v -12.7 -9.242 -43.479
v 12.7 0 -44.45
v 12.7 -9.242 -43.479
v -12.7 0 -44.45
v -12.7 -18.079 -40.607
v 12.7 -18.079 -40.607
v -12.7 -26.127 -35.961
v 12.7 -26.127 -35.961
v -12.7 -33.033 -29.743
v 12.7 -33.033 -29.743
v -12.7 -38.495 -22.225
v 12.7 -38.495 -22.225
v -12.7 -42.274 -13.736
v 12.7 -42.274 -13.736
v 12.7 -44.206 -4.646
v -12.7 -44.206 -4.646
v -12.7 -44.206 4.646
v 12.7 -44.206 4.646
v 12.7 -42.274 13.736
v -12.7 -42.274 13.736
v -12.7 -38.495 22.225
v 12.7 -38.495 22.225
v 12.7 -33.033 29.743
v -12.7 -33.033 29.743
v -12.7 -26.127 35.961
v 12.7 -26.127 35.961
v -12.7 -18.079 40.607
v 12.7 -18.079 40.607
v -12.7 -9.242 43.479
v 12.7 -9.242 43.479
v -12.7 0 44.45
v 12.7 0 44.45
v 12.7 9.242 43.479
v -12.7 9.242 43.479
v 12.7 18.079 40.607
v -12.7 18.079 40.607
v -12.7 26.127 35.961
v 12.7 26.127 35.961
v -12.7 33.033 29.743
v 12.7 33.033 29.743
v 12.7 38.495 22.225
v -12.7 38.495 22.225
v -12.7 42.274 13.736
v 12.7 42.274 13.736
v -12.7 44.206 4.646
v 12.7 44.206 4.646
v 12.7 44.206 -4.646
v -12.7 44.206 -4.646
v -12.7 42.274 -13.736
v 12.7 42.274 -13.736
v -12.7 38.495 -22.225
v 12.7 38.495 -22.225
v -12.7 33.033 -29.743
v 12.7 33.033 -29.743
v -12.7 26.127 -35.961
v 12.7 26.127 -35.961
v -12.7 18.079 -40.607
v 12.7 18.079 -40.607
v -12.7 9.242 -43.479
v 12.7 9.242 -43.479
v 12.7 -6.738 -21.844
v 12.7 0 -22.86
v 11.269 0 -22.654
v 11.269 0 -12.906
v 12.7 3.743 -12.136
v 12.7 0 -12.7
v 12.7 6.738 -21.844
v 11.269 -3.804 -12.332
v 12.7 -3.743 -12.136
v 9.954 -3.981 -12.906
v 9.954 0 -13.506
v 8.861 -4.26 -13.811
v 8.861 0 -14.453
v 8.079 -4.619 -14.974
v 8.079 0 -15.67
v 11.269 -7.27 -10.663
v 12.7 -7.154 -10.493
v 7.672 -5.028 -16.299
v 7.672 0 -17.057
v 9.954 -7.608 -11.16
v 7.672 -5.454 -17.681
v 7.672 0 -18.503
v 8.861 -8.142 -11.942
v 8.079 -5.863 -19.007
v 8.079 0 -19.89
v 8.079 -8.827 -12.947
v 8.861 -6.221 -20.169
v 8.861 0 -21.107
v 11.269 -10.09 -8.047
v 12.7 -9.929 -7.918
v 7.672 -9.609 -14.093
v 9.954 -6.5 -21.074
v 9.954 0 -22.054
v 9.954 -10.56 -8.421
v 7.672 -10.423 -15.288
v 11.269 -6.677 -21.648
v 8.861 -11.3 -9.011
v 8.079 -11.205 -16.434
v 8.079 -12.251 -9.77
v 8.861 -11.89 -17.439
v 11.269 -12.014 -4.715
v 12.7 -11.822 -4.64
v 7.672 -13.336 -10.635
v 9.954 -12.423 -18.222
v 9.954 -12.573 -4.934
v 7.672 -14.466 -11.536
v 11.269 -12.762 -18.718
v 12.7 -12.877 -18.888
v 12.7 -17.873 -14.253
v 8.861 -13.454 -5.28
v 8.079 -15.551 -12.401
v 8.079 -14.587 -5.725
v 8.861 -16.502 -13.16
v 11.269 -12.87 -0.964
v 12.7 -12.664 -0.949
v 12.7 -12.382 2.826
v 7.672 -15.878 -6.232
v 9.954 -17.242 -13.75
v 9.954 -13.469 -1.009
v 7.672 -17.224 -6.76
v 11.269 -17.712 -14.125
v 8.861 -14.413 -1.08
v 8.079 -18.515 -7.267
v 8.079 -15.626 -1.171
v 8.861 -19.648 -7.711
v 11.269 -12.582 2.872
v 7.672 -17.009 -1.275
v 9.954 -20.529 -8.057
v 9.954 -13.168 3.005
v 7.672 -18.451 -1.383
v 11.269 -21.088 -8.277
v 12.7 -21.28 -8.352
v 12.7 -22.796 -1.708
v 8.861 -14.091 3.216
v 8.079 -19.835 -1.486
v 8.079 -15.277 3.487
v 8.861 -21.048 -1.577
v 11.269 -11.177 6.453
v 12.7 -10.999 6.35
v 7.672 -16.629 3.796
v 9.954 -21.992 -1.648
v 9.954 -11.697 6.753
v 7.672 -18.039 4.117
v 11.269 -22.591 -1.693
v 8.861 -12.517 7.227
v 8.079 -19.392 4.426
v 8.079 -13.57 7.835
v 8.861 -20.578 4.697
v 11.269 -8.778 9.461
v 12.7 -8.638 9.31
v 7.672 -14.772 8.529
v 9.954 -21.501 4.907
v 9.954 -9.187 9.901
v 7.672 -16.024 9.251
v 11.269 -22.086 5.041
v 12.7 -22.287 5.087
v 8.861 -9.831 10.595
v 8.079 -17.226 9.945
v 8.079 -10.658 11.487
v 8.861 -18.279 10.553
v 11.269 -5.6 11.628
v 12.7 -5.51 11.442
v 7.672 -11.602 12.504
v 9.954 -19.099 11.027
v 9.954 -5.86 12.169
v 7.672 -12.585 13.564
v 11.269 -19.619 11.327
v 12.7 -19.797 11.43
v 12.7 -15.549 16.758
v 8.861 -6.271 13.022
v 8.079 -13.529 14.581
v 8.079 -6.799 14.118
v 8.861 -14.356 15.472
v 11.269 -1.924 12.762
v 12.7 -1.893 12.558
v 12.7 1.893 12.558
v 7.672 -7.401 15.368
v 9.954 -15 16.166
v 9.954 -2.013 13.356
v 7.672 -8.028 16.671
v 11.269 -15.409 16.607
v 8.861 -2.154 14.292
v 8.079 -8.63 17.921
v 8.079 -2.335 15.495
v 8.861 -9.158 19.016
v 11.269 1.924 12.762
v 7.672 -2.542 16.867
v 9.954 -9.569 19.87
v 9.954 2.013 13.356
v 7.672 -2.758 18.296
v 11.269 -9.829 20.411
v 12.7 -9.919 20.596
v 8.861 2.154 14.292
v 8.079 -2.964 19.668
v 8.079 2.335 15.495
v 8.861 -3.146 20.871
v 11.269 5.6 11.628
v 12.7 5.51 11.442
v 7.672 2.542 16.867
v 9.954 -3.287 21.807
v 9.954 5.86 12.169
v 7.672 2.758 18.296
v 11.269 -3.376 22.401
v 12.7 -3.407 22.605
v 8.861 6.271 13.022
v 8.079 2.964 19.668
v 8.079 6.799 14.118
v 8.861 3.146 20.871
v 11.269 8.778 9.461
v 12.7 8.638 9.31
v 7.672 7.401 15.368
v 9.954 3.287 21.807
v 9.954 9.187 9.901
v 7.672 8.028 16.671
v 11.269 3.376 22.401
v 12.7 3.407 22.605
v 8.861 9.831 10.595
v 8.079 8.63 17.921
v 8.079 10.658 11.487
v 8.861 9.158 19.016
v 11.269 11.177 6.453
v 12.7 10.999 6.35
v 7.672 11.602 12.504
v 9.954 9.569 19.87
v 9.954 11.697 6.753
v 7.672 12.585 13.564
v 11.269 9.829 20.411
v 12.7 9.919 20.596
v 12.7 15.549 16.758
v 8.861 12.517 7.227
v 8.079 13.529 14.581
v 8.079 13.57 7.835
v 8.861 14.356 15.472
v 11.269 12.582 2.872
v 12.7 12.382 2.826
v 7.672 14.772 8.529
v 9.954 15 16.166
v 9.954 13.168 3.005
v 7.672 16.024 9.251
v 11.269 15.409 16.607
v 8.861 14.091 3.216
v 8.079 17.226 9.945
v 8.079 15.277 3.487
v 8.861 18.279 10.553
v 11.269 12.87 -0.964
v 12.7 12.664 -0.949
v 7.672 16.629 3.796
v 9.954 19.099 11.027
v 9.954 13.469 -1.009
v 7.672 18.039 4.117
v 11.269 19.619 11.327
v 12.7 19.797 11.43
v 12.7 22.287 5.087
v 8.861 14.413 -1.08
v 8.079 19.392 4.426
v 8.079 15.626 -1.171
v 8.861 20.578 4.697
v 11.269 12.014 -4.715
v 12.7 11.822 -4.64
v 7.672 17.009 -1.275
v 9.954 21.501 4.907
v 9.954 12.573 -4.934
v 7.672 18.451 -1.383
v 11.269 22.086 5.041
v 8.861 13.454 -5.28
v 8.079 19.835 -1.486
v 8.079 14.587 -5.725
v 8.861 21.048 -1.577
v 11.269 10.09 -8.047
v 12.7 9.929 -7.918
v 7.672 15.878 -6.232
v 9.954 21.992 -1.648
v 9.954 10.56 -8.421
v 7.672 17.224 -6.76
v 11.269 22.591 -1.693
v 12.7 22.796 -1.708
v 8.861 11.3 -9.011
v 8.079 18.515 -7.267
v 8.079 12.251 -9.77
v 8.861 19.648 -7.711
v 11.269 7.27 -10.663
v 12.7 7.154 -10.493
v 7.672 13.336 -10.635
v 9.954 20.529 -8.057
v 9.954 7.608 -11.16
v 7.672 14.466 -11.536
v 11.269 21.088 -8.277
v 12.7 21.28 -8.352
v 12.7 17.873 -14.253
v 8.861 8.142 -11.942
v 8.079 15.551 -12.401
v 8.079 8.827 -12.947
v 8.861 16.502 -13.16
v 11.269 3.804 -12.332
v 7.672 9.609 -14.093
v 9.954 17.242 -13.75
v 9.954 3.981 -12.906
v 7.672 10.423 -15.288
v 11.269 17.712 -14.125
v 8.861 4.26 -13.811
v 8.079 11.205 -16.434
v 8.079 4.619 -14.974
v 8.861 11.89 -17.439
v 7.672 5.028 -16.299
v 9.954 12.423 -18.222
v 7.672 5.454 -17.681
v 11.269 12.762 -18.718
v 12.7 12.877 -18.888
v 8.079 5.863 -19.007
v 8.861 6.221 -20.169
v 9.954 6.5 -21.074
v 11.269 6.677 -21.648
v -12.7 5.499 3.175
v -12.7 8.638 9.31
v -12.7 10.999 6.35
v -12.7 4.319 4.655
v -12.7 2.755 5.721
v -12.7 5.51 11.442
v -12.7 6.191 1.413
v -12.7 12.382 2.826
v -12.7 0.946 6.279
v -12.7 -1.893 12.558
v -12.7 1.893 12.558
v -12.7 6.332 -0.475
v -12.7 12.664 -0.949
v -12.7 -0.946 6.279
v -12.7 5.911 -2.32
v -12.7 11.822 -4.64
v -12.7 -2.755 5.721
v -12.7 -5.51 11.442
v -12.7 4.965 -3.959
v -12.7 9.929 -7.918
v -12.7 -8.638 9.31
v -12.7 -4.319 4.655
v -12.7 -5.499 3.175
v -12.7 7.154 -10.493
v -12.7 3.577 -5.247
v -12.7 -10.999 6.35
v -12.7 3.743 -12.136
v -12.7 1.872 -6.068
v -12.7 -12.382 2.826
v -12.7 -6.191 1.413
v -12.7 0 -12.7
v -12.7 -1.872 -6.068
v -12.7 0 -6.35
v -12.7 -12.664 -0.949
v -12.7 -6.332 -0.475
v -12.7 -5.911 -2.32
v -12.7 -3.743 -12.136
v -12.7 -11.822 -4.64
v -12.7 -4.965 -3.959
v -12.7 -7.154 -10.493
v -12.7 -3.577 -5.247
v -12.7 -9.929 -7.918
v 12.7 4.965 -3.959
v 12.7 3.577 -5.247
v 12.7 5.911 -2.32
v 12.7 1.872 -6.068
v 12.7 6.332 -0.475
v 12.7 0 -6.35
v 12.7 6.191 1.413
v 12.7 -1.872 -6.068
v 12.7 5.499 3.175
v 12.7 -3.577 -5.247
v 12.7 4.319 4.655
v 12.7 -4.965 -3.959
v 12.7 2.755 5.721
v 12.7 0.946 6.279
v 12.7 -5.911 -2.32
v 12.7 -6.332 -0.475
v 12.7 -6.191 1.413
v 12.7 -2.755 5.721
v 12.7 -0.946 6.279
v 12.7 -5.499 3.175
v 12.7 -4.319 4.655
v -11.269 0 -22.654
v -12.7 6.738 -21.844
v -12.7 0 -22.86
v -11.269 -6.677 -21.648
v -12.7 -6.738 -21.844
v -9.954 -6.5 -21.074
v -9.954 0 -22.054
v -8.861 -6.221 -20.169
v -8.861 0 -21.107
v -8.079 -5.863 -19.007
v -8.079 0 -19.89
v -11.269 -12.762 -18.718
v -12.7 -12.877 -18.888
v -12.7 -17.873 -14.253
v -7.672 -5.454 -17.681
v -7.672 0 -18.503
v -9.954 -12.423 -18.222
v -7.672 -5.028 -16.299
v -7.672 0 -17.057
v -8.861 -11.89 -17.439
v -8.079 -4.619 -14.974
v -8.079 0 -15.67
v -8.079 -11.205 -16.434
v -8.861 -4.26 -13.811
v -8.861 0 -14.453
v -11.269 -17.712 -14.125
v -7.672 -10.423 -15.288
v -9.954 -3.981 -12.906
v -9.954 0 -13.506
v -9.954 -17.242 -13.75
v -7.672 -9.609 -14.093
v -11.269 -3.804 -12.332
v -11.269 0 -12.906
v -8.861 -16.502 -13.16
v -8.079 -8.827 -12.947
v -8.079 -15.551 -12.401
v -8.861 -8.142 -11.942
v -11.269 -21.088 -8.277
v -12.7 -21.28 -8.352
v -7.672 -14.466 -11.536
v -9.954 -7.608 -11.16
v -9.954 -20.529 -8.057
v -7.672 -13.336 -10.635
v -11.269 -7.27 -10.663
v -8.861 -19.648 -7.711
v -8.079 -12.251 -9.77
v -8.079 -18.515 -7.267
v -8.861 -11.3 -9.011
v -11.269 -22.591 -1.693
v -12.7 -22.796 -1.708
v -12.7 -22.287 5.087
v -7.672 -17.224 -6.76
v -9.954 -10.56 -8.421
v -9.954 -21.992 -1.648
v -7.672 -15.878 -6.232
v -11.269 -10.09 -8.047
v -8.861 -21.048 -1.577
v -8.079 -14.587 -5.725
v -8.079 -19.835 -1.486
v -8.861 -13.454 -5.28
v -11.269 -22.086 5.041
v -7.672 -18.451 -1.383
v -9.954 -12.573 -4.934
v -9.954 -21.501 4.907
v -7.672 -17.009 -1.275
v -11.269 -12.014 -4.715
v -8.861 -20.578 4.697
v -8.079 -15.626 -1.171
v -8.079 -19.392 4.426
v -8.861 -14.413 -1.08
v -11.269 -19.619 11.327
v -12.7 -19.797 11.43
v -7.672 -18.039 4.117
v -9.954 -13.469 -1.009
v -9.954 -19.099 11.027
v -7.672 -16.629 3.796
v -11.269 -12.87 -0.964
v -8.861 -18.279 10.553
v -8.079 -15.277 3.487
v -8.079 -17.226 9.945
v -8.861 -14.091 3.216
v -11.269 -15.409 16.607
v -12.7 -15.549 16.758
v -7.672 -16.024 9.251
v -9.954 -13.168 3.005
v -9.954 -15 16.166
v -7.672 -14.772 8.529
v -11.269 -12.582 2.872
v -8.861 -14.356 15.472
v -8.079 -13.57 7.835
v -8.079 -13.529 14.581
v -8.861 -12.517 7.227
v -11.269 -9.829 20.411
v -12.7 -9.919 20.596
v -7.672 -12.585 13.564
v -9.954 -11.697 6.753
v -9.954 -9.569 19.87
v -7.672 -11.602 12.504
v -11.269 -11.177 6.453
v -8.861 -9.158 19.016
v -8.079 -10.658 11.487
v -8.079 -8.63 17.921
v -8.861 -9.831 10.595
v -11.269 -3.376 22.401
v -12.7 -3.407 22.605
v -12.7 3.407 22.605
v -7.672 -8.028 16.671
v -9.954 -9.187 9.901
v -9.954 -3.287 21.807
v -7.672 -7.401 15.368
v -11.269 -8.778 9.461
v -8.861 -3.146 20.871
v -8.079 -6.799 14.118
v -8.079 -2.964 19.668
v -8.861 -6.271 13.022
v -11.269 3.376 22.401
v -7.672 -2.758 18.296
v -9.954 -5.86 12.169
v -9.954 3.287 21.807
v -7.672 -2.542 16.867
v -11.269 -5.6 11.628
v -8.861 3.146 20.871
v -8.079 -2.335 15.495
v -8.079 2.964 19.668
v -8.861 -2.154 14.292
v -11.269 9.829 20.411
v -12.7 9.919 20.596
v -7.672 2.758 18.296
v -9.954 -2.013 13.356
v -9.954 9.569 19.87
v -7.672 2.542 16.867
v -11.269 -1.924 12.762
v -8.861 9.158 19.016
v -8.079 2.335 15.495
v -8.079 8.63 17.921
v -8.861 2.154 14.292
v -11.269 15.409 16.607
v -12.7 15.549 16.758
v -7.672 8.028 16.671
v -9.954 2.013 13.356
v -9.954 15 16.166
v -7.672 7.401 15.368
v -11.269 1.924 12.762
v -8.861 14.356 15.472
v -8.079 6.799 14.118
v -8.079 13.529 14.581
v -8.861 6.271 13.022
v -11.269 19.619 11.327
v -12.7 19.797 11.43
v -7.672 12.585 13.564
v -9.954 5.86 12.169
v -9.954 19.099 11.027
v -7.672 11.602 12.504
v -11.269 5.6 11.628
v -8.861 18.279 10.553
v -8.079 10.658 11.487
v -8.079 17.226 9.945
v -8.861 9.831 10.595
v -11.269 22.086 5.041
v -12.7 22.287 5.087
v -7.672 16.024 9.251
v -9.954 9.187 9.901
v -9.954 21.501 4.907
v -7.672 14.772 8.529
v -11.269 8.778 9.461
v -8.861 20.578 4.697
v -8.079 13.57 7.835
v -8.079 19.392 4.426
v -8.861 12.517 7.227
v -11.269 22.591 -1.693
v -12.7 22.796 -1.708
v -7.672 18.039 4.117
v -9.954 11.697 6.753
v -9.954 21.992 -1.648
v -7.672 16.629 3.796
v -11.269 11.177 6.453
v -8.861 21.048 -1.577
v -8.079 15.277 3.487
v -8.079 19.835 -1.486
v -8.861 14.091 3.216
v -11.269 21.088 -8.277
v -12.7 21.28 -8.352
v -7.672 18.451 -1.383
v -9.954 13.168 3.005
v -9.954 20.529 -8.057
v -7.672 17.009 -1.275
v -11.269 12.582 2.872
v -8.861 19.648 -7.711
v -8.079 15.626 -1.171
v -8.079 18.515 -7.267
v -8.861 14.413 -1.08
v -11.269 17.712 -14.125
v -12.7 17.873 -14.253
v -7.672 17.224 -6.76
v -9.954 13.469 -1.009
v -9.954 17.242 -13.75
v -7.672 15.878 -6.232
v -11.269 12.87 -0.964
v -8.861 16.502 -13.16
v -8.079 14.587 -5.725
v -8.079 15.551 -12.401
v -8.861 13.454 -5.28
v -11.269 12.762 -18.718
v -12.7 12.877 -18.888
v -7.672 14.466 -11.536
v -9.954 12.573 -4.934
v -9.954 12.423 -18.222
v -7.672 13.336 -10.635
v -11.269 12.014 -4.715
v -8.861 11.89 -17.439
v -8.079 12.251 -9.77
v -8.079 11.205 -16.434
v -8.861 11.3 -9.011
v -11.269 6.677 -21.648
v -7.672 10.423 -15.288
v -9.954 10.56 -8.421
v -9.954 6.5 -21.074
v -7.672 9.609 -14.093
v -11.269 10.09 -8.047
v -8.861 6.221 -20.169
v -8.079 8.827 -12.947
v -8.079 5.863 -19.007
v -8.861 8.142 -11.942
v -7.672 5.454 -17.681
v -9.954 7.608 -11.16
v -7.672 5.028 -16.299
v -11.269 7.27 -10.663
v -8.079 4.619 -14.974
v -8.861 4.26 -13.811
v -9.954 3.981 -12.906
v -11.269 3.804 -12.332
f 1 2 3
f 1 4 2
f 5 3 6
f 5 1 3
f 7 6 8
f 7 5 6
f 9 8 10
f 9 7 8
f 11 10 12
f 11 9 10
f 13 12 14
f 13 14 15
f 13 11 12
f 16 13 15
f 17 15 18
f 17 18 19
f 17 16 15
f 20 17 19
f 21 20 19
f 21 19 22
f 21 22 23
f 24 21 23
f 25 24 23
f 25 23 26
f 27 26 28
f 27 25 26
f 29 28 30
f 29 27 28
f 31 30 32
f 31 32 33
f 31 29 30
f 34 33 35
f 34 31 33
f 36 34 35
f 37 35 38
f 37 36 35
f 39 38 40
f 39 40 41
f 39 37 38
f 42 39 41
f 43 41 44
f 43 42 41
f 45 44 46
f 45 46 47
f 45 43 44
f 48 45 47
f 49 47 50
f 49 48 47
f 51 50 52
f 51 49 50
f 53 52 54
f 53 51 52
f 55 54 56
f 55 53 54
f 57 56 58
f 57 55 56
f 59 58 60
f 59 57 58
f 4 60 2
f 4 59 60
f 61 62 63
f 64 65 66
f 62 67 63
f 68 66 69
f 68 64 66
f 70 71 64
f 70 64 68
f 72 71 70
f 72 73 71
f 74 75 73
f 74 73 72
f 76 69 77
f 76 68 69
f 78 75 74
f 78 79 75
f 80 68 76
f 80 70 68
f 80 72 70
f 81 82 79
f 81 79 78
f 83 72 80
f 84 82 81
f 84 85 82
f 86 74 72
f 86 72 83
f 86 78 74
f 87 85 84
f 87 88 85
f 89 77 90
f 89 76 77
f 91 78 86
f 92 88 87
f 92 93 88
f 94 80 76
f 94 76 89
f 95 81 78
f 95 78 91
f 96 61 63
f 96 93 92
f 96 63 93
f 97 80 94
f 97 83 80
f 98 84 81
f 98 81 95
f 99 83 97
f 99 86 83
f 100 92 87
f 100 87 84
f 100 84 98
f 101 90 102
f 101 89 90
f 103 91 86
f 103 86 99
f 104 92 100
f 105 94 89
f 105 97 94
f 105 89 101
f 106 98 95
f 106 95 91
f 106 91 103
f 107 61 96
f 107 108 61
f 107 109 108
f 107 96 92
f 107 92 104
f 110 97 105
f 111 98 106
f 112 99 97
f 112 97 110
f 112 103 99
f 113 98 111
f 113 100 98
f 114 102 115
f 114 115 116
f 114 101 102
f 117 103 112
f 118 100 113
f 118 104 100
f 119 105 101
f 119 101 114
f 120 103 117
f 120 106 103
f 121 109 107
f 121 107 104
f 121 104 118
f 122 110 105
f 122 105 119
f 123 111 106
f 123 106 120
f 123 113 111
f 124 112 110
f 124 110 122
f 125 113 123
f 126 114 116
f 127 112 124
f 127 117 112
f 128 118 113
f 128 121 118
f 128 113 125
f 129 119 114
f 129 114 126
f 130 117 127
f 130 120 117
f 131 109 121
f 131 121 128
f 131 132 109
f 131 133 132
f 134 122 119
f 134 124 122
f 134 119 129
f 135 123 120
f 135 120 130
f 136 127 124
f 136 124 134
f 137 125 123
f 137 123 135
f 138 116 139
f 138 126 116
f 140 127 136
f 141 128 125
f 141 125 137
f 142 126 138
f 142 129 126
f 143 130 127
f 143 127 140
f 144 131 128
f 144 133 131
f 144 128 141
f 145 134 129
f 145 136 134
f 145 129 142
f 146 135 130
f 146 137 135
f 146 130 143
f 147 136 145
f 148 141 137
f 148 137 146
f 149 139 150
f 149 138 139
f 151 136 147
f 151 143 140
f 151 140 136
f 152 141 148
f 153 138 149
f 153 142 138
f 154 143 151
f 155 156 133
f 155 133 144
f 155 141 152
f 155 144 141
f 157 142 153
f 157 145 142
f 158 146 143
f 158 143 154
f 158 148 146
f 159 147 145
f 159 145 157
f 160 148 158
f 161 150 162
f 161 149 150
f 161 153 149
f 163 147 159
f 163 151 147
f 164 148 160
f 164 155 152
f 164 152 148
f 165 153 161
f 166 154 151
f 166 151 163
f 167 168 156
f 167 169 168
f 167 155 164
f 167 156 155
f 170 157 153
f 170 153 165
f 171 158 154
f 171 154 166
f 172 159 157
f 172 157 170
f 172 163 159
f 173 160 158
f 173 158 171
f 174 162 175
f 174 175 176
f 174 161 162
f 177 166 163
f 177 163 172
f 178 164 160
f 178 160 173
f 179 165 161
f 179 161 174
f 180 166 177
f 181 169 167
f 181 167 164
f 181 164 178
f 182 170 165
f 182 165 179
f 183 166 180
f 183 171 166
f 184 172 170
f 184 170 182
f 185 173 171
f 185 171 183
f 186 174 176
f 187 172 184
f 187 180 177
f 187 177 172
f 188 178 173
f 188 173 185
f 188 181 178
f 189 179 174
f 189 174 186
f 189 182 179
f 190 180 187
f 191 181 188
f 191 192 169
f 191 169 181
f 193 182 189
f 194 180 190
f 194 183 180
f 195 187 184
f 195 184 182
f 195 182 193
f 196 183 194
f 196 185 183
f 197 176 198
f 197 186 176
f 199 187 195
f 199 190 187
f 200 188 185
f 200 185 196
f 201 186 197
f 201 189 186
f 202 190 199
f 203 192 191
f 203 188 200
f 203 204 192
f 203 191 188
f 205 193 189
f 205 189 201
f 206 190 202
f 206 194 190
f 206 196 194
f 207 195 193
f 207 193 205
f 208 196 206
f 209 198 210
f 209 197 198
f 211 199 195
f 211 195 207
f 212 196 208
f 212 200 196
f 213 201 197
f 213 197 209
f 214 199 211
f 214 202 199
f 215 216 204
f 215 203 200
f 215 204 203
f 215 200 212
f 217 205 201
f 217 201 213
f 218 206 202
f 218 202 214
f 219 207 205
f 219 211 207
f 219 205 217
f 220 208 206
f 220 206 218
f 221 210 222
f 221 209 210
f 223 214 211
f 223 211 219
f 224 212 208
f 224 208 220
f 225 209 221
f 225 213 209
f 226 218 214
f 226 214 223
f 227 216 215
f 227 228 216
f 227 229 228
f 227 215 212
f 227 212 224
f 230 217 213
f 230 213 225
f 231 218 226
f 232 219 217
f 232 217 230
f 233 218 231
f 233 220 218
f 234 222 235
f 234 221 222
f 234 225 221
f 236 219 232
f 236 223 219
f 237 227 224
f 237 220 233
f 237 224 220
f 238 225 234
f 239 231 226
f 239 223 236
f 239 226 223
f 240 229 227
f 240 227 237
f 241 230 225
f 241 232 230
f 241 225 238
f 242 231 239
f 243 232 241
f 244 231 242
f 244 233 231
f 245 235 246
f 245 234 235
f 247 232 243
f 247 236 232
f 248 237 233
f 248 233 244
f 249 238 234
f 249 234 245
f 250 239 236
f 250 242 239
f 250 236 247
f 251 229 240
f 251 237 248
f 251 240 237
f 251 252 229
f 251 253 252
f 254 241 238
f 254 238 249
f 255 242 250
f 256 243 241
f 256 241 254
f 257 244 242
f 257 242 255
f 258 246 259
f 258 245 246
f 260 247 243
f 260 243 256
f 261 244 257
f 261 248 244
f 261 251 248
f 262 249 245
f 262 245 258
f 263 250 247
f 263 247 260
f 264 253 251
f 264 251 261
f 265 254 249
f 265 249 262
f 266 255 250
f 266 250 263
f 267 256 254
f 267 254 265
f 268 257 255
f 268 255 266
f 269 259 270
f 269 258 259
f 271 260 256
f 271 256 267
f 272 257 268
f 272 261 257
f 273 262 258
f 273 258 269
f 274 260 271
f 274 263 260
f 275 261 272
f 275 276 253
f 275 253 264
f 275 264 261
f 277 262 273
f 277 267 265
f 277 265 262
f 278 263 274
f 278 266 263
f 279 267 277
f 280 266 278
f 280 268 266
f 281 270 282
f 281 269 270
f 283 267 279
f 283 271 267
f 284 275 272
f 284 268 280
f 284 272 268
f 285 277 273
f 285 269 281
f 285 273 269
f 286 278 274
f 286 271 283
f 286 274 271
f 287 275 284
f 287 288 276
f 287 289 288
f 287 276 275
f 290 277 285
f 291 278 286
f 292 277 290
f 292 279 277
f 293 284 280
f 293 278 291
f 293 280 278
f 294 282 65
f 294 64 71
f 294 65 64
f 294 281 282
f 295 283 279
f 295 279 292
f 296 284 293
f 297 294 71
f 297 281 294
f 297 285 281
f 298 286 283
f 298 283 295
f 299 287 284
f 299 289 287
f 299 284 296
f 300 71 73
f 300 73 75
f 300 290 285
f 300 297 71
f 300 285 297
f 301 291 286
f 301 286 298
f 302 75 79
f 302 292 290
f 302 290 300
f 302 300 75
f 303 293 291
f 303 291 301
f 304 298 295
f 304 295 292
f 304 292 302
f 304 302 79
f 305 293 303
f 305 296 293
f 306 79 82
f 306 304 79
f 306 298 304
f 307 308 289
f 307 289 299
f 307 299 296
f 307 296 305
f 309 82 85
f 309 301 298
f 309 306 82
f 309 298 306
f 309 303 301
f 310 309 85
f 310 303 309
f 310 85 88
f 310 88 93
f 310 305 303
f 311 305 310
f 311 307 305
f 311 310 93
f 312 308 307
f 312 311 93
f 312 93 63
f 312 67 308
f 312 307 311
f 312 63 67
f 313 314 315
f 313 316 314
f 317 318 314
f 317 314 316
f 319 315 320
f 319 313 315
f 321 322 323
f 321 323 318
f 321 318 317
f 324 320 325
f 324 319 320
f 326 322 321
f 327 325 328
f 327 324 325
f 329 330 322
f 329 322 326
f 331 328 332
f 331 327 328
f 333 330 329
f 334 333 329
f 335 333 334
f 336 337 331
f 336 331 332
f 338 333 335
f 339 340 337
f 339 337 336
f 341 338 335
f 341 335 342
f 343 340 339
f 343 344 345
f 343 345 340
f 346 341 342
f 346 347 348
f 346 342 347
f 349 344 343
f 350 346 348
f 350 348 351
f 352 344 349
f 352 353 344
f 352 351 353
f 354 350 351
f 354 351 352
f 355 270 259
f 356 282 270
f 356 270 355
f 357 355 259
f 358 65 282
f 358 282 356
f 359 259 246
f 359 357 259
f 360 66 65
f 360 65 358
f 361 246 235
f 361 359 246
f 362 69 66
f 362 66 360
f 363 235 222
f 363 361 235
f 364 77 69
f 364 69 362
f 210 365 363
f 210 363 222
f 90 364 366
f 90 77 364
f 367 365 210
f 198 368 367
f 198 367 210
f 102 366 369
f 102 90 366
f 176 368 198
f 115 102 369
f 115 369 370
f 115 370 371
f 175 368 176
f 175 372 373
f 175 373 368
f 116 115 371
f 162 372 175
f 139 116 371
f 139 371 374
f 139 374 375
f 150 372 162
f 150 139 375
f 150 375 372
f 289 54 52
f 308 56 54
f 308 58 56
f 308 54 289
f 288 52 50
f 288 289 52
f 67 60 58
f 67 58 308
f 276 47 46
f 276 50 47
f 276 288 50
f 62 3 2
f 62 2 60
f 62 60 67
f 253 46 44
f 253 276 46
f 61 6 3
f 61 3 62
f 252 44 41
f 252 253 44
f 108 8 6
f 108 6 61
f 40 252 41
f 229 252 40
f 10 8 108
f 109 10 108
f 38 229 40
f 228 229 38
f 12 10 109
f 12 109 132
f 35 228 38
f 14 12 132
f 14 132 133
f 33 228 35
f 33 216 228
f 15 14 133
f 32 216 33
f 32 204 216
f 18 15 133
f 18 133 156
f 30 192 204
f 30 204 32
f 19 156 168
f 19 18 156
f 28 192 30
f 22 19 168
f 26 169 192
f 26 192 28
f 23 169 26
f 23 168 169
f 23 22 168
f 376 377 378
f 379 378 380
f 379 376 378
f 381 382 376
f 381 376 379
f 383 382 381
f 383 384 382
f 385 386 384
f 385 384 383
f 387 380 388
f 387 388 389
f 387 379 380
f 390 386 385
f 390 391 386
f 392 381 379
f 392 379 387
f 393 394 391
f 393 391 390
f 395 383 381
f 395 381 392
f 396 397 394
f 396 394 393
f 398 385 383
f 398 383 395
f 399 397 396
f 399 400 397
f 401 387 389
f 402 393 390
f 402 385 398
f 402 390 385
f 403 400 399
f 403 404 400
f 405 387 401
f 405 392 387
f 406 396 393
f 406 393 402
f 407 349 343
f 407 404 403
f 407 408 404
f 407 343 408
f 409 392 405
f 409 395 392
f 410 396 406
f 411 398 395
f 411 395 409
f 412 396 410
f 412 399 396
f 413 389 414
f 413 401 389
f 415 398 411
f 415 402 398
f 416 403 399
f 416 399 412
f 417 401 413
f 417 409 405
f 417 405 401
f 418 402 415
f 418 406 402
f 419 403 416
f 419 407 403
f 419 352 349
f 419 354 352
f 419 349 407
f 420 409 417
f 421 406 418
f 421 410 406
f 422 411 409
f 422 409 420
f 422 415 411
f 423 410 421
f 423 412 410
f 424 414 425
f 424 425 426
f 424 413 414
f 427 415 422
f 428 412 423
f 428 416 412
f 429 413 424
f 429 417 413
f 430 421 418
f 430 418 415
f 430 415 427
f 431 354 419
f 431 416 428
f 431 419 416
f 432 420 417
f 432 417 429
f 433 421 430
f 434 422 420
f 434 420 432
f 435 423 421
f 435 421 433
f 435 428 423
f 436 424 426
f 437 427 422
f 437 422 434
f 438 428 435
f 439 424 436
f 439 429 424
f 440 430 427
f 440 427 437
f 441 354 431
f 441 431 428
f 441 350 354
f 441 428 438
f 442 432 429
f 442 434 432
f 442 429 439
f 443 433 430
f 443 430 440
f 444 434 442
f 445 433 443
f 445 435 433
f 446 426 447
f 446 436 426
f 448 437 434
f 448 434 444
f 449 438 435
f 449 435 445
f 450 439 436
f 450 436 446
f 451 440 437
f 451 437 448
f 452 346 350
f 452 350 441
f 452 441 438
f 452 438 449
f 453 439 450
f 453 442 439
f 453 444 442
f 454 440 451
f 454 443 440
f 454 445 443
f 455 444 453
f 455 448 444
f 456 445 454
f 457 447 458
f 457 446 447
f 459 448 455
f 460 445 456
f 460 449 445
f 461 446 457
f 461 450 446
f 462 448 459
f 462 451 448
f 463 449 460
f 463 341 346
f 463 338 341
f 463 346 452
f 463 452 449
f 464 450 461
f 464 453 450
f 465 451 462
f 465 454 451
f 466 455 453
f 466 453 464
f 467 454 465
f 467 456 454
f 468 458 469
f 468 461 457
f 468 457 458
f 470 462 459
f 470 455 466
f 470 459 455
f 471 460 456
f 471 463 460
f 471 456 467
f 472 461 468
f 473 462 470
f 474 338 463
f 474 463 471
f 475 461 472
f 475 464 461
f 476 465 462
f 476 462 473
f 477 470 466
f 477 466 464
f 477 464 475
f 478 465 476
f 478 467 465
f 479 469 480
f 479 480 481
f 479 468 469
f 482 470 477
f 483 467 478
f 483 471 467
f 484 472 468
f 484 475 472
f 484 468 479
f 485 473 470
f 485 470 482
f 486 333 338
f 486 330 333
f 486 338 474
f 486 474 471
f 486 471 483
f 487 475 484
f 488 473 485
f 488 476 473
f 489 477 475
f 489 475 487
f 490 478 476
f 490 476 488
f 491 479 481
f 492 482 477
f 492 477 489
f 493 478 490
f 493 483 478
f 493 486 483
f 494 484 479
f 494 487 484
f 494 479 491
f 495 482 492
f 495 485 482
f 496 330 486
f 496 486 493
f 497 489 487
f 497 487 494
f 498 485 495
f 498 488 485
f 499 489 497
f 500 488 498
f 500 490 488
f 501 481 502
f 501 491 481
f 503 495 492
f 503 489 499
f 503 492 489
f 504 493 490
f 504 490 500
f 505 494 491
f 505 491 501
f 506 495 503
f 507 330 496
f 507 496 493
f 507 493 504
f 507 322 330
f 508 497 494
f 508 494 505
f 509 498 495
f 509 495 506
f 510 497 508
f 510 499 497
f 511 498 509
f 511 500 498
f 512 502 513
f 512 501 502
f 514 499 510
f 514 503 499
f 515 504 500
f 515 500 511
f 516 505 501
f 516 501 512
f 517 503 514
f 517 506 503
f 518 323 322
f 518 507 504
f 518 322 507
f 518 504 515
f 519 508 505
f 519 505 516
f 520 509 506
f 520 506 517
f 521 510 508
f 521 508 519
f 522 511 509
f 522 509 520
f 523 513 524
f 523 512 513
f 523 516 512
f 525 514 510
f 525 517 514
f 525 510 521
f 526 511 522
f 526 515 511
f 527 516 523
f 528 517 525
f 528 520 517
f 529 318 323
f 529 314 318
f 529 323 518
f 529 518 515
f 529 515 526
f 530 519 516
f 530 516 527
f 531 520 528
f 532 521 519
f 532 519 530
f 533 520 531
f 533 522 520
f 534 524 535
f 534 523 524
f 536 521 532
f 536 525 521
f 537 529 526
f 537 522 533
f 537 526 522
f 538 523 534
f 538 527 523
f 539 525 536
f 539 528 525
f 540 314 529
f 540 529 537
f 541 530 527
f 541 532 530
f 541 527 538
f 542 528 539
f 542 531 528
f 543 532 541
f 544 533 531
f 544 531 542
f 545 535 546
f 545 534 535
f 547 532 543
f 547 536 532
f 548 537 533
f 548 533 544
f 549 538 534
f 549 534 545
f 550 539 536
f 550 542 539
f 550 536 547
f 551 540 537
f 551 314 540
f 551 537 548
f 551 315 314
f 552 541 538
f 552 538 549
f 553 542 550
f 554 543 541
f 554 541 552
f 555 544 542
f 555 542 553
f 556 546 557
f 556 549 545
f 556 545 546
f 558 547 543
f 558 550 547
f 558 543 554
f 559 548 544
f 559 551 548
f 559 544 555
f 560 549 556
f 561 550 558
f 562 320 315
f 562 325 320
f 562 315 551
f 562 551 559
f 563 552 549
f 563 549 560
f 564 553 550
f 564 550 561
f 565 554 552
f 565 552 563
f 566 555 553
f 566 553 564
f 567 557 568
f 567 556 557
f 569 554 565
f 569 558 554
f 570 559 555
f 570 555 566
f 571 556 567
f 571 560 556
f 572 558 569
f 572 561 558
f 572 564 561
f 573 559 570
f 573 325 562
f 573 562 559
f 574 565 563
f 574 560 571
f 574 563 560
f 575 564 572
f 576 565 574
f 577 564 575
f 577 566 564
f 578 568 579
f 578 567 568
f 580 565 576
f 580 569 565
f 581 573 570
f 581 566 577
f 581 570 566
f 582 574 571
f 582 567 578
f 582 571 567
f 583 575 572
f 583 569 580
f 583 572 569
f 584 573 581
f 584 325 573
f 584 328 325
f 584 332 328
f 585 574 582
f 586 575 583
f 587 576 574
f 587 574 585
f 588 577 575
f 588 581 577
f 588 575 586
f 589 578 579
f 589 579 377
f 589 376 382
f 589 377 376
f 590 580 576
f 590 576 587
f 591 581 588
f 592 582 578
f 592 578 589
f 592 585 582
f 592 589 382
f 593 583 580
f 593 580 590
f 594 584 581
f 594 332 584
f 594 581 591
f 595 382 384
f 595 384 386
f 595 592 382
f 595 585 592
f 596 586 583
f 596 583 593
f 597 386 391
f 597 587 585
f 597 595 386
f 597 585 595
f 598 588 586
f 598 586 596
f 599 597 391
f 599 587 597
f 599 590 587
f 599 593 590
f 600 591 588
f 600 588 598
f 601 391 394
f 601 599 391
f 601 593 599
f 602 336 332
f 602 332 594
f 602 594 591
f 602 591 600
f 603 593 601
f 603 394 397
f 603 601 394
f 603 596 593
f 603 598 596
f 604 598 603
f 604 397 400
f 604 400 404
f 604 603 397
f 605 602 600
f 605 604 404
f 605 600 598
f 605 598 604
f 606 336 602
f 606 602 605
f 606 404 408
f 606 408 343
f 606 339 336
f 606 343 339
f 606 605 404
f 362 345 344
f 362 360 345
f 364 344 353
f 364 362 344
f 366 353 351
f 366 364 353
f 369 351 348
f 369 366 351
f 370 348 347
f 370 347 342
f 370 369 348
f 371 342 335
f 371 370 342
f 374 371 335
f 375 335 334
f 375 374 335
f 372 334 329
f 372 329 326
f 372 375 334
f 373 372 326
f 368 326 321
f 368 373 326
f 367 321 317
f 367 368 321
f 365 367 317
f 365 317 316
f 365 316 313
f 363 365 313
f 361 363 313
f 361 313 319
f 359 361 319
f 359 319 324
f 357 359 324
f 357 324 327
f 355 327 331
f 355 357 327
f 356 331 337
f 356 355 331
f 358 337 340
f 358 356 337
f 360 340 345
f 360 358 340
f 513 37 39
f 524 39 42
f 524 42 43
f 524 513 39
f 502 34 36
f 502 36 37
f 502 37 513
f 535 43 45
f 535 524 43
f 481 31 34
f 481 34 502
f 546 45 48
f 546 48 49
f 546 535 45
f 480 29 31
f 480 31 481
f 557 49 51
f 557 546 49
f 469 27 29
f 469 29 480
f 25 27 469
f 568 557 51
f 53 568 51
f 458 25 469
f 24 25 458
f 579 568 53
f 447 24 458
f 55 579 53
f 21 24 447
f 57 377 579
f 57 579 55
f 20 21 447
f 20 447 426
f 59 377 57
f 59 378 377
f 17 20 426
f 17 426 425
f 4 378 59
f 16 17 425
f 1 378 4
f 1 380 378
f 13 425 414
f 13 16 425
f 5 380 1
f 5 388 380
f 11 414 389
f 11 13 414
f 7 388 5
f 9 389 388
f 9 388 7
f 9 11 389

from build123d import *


with BuildPart() as part:
    # Sketch1 → Revolve1 (revolve)
    with BuildSketch(Plane.XY, mode=Mode.PRIVATE) as revolve1_sk:
        with BuildLine():
            Line((12.7, 22.86), (12.7, 44.45))
            Line((12.7, 44.45), (-12.7, 44.45))
            Line((-12.7, 44.45), (-12.7, 22.86))
            ThreePointArc((-12.7, 22.86), (-7.62, 17.78), (-12.7, 12.7))
            Line((-12.7, 12.7), (-12.7, 6.35))
            Line((-12.7, 6.35), (12.7, 6.35))
            Line((12.7, 6.35), (12.7, 12.7))
            ThreePointArc((12.7, 12.7), (7.62, 17.78), (12.7, 22.86))
        make_face()
    revolve(revolve1_sk.sketch.rotate(Axis((12.7, 0, 0), (-1, 0, 0)), 90), axis=Axis((12.7, 0, 0), (-1, 0, 0)))


solid = part.part
